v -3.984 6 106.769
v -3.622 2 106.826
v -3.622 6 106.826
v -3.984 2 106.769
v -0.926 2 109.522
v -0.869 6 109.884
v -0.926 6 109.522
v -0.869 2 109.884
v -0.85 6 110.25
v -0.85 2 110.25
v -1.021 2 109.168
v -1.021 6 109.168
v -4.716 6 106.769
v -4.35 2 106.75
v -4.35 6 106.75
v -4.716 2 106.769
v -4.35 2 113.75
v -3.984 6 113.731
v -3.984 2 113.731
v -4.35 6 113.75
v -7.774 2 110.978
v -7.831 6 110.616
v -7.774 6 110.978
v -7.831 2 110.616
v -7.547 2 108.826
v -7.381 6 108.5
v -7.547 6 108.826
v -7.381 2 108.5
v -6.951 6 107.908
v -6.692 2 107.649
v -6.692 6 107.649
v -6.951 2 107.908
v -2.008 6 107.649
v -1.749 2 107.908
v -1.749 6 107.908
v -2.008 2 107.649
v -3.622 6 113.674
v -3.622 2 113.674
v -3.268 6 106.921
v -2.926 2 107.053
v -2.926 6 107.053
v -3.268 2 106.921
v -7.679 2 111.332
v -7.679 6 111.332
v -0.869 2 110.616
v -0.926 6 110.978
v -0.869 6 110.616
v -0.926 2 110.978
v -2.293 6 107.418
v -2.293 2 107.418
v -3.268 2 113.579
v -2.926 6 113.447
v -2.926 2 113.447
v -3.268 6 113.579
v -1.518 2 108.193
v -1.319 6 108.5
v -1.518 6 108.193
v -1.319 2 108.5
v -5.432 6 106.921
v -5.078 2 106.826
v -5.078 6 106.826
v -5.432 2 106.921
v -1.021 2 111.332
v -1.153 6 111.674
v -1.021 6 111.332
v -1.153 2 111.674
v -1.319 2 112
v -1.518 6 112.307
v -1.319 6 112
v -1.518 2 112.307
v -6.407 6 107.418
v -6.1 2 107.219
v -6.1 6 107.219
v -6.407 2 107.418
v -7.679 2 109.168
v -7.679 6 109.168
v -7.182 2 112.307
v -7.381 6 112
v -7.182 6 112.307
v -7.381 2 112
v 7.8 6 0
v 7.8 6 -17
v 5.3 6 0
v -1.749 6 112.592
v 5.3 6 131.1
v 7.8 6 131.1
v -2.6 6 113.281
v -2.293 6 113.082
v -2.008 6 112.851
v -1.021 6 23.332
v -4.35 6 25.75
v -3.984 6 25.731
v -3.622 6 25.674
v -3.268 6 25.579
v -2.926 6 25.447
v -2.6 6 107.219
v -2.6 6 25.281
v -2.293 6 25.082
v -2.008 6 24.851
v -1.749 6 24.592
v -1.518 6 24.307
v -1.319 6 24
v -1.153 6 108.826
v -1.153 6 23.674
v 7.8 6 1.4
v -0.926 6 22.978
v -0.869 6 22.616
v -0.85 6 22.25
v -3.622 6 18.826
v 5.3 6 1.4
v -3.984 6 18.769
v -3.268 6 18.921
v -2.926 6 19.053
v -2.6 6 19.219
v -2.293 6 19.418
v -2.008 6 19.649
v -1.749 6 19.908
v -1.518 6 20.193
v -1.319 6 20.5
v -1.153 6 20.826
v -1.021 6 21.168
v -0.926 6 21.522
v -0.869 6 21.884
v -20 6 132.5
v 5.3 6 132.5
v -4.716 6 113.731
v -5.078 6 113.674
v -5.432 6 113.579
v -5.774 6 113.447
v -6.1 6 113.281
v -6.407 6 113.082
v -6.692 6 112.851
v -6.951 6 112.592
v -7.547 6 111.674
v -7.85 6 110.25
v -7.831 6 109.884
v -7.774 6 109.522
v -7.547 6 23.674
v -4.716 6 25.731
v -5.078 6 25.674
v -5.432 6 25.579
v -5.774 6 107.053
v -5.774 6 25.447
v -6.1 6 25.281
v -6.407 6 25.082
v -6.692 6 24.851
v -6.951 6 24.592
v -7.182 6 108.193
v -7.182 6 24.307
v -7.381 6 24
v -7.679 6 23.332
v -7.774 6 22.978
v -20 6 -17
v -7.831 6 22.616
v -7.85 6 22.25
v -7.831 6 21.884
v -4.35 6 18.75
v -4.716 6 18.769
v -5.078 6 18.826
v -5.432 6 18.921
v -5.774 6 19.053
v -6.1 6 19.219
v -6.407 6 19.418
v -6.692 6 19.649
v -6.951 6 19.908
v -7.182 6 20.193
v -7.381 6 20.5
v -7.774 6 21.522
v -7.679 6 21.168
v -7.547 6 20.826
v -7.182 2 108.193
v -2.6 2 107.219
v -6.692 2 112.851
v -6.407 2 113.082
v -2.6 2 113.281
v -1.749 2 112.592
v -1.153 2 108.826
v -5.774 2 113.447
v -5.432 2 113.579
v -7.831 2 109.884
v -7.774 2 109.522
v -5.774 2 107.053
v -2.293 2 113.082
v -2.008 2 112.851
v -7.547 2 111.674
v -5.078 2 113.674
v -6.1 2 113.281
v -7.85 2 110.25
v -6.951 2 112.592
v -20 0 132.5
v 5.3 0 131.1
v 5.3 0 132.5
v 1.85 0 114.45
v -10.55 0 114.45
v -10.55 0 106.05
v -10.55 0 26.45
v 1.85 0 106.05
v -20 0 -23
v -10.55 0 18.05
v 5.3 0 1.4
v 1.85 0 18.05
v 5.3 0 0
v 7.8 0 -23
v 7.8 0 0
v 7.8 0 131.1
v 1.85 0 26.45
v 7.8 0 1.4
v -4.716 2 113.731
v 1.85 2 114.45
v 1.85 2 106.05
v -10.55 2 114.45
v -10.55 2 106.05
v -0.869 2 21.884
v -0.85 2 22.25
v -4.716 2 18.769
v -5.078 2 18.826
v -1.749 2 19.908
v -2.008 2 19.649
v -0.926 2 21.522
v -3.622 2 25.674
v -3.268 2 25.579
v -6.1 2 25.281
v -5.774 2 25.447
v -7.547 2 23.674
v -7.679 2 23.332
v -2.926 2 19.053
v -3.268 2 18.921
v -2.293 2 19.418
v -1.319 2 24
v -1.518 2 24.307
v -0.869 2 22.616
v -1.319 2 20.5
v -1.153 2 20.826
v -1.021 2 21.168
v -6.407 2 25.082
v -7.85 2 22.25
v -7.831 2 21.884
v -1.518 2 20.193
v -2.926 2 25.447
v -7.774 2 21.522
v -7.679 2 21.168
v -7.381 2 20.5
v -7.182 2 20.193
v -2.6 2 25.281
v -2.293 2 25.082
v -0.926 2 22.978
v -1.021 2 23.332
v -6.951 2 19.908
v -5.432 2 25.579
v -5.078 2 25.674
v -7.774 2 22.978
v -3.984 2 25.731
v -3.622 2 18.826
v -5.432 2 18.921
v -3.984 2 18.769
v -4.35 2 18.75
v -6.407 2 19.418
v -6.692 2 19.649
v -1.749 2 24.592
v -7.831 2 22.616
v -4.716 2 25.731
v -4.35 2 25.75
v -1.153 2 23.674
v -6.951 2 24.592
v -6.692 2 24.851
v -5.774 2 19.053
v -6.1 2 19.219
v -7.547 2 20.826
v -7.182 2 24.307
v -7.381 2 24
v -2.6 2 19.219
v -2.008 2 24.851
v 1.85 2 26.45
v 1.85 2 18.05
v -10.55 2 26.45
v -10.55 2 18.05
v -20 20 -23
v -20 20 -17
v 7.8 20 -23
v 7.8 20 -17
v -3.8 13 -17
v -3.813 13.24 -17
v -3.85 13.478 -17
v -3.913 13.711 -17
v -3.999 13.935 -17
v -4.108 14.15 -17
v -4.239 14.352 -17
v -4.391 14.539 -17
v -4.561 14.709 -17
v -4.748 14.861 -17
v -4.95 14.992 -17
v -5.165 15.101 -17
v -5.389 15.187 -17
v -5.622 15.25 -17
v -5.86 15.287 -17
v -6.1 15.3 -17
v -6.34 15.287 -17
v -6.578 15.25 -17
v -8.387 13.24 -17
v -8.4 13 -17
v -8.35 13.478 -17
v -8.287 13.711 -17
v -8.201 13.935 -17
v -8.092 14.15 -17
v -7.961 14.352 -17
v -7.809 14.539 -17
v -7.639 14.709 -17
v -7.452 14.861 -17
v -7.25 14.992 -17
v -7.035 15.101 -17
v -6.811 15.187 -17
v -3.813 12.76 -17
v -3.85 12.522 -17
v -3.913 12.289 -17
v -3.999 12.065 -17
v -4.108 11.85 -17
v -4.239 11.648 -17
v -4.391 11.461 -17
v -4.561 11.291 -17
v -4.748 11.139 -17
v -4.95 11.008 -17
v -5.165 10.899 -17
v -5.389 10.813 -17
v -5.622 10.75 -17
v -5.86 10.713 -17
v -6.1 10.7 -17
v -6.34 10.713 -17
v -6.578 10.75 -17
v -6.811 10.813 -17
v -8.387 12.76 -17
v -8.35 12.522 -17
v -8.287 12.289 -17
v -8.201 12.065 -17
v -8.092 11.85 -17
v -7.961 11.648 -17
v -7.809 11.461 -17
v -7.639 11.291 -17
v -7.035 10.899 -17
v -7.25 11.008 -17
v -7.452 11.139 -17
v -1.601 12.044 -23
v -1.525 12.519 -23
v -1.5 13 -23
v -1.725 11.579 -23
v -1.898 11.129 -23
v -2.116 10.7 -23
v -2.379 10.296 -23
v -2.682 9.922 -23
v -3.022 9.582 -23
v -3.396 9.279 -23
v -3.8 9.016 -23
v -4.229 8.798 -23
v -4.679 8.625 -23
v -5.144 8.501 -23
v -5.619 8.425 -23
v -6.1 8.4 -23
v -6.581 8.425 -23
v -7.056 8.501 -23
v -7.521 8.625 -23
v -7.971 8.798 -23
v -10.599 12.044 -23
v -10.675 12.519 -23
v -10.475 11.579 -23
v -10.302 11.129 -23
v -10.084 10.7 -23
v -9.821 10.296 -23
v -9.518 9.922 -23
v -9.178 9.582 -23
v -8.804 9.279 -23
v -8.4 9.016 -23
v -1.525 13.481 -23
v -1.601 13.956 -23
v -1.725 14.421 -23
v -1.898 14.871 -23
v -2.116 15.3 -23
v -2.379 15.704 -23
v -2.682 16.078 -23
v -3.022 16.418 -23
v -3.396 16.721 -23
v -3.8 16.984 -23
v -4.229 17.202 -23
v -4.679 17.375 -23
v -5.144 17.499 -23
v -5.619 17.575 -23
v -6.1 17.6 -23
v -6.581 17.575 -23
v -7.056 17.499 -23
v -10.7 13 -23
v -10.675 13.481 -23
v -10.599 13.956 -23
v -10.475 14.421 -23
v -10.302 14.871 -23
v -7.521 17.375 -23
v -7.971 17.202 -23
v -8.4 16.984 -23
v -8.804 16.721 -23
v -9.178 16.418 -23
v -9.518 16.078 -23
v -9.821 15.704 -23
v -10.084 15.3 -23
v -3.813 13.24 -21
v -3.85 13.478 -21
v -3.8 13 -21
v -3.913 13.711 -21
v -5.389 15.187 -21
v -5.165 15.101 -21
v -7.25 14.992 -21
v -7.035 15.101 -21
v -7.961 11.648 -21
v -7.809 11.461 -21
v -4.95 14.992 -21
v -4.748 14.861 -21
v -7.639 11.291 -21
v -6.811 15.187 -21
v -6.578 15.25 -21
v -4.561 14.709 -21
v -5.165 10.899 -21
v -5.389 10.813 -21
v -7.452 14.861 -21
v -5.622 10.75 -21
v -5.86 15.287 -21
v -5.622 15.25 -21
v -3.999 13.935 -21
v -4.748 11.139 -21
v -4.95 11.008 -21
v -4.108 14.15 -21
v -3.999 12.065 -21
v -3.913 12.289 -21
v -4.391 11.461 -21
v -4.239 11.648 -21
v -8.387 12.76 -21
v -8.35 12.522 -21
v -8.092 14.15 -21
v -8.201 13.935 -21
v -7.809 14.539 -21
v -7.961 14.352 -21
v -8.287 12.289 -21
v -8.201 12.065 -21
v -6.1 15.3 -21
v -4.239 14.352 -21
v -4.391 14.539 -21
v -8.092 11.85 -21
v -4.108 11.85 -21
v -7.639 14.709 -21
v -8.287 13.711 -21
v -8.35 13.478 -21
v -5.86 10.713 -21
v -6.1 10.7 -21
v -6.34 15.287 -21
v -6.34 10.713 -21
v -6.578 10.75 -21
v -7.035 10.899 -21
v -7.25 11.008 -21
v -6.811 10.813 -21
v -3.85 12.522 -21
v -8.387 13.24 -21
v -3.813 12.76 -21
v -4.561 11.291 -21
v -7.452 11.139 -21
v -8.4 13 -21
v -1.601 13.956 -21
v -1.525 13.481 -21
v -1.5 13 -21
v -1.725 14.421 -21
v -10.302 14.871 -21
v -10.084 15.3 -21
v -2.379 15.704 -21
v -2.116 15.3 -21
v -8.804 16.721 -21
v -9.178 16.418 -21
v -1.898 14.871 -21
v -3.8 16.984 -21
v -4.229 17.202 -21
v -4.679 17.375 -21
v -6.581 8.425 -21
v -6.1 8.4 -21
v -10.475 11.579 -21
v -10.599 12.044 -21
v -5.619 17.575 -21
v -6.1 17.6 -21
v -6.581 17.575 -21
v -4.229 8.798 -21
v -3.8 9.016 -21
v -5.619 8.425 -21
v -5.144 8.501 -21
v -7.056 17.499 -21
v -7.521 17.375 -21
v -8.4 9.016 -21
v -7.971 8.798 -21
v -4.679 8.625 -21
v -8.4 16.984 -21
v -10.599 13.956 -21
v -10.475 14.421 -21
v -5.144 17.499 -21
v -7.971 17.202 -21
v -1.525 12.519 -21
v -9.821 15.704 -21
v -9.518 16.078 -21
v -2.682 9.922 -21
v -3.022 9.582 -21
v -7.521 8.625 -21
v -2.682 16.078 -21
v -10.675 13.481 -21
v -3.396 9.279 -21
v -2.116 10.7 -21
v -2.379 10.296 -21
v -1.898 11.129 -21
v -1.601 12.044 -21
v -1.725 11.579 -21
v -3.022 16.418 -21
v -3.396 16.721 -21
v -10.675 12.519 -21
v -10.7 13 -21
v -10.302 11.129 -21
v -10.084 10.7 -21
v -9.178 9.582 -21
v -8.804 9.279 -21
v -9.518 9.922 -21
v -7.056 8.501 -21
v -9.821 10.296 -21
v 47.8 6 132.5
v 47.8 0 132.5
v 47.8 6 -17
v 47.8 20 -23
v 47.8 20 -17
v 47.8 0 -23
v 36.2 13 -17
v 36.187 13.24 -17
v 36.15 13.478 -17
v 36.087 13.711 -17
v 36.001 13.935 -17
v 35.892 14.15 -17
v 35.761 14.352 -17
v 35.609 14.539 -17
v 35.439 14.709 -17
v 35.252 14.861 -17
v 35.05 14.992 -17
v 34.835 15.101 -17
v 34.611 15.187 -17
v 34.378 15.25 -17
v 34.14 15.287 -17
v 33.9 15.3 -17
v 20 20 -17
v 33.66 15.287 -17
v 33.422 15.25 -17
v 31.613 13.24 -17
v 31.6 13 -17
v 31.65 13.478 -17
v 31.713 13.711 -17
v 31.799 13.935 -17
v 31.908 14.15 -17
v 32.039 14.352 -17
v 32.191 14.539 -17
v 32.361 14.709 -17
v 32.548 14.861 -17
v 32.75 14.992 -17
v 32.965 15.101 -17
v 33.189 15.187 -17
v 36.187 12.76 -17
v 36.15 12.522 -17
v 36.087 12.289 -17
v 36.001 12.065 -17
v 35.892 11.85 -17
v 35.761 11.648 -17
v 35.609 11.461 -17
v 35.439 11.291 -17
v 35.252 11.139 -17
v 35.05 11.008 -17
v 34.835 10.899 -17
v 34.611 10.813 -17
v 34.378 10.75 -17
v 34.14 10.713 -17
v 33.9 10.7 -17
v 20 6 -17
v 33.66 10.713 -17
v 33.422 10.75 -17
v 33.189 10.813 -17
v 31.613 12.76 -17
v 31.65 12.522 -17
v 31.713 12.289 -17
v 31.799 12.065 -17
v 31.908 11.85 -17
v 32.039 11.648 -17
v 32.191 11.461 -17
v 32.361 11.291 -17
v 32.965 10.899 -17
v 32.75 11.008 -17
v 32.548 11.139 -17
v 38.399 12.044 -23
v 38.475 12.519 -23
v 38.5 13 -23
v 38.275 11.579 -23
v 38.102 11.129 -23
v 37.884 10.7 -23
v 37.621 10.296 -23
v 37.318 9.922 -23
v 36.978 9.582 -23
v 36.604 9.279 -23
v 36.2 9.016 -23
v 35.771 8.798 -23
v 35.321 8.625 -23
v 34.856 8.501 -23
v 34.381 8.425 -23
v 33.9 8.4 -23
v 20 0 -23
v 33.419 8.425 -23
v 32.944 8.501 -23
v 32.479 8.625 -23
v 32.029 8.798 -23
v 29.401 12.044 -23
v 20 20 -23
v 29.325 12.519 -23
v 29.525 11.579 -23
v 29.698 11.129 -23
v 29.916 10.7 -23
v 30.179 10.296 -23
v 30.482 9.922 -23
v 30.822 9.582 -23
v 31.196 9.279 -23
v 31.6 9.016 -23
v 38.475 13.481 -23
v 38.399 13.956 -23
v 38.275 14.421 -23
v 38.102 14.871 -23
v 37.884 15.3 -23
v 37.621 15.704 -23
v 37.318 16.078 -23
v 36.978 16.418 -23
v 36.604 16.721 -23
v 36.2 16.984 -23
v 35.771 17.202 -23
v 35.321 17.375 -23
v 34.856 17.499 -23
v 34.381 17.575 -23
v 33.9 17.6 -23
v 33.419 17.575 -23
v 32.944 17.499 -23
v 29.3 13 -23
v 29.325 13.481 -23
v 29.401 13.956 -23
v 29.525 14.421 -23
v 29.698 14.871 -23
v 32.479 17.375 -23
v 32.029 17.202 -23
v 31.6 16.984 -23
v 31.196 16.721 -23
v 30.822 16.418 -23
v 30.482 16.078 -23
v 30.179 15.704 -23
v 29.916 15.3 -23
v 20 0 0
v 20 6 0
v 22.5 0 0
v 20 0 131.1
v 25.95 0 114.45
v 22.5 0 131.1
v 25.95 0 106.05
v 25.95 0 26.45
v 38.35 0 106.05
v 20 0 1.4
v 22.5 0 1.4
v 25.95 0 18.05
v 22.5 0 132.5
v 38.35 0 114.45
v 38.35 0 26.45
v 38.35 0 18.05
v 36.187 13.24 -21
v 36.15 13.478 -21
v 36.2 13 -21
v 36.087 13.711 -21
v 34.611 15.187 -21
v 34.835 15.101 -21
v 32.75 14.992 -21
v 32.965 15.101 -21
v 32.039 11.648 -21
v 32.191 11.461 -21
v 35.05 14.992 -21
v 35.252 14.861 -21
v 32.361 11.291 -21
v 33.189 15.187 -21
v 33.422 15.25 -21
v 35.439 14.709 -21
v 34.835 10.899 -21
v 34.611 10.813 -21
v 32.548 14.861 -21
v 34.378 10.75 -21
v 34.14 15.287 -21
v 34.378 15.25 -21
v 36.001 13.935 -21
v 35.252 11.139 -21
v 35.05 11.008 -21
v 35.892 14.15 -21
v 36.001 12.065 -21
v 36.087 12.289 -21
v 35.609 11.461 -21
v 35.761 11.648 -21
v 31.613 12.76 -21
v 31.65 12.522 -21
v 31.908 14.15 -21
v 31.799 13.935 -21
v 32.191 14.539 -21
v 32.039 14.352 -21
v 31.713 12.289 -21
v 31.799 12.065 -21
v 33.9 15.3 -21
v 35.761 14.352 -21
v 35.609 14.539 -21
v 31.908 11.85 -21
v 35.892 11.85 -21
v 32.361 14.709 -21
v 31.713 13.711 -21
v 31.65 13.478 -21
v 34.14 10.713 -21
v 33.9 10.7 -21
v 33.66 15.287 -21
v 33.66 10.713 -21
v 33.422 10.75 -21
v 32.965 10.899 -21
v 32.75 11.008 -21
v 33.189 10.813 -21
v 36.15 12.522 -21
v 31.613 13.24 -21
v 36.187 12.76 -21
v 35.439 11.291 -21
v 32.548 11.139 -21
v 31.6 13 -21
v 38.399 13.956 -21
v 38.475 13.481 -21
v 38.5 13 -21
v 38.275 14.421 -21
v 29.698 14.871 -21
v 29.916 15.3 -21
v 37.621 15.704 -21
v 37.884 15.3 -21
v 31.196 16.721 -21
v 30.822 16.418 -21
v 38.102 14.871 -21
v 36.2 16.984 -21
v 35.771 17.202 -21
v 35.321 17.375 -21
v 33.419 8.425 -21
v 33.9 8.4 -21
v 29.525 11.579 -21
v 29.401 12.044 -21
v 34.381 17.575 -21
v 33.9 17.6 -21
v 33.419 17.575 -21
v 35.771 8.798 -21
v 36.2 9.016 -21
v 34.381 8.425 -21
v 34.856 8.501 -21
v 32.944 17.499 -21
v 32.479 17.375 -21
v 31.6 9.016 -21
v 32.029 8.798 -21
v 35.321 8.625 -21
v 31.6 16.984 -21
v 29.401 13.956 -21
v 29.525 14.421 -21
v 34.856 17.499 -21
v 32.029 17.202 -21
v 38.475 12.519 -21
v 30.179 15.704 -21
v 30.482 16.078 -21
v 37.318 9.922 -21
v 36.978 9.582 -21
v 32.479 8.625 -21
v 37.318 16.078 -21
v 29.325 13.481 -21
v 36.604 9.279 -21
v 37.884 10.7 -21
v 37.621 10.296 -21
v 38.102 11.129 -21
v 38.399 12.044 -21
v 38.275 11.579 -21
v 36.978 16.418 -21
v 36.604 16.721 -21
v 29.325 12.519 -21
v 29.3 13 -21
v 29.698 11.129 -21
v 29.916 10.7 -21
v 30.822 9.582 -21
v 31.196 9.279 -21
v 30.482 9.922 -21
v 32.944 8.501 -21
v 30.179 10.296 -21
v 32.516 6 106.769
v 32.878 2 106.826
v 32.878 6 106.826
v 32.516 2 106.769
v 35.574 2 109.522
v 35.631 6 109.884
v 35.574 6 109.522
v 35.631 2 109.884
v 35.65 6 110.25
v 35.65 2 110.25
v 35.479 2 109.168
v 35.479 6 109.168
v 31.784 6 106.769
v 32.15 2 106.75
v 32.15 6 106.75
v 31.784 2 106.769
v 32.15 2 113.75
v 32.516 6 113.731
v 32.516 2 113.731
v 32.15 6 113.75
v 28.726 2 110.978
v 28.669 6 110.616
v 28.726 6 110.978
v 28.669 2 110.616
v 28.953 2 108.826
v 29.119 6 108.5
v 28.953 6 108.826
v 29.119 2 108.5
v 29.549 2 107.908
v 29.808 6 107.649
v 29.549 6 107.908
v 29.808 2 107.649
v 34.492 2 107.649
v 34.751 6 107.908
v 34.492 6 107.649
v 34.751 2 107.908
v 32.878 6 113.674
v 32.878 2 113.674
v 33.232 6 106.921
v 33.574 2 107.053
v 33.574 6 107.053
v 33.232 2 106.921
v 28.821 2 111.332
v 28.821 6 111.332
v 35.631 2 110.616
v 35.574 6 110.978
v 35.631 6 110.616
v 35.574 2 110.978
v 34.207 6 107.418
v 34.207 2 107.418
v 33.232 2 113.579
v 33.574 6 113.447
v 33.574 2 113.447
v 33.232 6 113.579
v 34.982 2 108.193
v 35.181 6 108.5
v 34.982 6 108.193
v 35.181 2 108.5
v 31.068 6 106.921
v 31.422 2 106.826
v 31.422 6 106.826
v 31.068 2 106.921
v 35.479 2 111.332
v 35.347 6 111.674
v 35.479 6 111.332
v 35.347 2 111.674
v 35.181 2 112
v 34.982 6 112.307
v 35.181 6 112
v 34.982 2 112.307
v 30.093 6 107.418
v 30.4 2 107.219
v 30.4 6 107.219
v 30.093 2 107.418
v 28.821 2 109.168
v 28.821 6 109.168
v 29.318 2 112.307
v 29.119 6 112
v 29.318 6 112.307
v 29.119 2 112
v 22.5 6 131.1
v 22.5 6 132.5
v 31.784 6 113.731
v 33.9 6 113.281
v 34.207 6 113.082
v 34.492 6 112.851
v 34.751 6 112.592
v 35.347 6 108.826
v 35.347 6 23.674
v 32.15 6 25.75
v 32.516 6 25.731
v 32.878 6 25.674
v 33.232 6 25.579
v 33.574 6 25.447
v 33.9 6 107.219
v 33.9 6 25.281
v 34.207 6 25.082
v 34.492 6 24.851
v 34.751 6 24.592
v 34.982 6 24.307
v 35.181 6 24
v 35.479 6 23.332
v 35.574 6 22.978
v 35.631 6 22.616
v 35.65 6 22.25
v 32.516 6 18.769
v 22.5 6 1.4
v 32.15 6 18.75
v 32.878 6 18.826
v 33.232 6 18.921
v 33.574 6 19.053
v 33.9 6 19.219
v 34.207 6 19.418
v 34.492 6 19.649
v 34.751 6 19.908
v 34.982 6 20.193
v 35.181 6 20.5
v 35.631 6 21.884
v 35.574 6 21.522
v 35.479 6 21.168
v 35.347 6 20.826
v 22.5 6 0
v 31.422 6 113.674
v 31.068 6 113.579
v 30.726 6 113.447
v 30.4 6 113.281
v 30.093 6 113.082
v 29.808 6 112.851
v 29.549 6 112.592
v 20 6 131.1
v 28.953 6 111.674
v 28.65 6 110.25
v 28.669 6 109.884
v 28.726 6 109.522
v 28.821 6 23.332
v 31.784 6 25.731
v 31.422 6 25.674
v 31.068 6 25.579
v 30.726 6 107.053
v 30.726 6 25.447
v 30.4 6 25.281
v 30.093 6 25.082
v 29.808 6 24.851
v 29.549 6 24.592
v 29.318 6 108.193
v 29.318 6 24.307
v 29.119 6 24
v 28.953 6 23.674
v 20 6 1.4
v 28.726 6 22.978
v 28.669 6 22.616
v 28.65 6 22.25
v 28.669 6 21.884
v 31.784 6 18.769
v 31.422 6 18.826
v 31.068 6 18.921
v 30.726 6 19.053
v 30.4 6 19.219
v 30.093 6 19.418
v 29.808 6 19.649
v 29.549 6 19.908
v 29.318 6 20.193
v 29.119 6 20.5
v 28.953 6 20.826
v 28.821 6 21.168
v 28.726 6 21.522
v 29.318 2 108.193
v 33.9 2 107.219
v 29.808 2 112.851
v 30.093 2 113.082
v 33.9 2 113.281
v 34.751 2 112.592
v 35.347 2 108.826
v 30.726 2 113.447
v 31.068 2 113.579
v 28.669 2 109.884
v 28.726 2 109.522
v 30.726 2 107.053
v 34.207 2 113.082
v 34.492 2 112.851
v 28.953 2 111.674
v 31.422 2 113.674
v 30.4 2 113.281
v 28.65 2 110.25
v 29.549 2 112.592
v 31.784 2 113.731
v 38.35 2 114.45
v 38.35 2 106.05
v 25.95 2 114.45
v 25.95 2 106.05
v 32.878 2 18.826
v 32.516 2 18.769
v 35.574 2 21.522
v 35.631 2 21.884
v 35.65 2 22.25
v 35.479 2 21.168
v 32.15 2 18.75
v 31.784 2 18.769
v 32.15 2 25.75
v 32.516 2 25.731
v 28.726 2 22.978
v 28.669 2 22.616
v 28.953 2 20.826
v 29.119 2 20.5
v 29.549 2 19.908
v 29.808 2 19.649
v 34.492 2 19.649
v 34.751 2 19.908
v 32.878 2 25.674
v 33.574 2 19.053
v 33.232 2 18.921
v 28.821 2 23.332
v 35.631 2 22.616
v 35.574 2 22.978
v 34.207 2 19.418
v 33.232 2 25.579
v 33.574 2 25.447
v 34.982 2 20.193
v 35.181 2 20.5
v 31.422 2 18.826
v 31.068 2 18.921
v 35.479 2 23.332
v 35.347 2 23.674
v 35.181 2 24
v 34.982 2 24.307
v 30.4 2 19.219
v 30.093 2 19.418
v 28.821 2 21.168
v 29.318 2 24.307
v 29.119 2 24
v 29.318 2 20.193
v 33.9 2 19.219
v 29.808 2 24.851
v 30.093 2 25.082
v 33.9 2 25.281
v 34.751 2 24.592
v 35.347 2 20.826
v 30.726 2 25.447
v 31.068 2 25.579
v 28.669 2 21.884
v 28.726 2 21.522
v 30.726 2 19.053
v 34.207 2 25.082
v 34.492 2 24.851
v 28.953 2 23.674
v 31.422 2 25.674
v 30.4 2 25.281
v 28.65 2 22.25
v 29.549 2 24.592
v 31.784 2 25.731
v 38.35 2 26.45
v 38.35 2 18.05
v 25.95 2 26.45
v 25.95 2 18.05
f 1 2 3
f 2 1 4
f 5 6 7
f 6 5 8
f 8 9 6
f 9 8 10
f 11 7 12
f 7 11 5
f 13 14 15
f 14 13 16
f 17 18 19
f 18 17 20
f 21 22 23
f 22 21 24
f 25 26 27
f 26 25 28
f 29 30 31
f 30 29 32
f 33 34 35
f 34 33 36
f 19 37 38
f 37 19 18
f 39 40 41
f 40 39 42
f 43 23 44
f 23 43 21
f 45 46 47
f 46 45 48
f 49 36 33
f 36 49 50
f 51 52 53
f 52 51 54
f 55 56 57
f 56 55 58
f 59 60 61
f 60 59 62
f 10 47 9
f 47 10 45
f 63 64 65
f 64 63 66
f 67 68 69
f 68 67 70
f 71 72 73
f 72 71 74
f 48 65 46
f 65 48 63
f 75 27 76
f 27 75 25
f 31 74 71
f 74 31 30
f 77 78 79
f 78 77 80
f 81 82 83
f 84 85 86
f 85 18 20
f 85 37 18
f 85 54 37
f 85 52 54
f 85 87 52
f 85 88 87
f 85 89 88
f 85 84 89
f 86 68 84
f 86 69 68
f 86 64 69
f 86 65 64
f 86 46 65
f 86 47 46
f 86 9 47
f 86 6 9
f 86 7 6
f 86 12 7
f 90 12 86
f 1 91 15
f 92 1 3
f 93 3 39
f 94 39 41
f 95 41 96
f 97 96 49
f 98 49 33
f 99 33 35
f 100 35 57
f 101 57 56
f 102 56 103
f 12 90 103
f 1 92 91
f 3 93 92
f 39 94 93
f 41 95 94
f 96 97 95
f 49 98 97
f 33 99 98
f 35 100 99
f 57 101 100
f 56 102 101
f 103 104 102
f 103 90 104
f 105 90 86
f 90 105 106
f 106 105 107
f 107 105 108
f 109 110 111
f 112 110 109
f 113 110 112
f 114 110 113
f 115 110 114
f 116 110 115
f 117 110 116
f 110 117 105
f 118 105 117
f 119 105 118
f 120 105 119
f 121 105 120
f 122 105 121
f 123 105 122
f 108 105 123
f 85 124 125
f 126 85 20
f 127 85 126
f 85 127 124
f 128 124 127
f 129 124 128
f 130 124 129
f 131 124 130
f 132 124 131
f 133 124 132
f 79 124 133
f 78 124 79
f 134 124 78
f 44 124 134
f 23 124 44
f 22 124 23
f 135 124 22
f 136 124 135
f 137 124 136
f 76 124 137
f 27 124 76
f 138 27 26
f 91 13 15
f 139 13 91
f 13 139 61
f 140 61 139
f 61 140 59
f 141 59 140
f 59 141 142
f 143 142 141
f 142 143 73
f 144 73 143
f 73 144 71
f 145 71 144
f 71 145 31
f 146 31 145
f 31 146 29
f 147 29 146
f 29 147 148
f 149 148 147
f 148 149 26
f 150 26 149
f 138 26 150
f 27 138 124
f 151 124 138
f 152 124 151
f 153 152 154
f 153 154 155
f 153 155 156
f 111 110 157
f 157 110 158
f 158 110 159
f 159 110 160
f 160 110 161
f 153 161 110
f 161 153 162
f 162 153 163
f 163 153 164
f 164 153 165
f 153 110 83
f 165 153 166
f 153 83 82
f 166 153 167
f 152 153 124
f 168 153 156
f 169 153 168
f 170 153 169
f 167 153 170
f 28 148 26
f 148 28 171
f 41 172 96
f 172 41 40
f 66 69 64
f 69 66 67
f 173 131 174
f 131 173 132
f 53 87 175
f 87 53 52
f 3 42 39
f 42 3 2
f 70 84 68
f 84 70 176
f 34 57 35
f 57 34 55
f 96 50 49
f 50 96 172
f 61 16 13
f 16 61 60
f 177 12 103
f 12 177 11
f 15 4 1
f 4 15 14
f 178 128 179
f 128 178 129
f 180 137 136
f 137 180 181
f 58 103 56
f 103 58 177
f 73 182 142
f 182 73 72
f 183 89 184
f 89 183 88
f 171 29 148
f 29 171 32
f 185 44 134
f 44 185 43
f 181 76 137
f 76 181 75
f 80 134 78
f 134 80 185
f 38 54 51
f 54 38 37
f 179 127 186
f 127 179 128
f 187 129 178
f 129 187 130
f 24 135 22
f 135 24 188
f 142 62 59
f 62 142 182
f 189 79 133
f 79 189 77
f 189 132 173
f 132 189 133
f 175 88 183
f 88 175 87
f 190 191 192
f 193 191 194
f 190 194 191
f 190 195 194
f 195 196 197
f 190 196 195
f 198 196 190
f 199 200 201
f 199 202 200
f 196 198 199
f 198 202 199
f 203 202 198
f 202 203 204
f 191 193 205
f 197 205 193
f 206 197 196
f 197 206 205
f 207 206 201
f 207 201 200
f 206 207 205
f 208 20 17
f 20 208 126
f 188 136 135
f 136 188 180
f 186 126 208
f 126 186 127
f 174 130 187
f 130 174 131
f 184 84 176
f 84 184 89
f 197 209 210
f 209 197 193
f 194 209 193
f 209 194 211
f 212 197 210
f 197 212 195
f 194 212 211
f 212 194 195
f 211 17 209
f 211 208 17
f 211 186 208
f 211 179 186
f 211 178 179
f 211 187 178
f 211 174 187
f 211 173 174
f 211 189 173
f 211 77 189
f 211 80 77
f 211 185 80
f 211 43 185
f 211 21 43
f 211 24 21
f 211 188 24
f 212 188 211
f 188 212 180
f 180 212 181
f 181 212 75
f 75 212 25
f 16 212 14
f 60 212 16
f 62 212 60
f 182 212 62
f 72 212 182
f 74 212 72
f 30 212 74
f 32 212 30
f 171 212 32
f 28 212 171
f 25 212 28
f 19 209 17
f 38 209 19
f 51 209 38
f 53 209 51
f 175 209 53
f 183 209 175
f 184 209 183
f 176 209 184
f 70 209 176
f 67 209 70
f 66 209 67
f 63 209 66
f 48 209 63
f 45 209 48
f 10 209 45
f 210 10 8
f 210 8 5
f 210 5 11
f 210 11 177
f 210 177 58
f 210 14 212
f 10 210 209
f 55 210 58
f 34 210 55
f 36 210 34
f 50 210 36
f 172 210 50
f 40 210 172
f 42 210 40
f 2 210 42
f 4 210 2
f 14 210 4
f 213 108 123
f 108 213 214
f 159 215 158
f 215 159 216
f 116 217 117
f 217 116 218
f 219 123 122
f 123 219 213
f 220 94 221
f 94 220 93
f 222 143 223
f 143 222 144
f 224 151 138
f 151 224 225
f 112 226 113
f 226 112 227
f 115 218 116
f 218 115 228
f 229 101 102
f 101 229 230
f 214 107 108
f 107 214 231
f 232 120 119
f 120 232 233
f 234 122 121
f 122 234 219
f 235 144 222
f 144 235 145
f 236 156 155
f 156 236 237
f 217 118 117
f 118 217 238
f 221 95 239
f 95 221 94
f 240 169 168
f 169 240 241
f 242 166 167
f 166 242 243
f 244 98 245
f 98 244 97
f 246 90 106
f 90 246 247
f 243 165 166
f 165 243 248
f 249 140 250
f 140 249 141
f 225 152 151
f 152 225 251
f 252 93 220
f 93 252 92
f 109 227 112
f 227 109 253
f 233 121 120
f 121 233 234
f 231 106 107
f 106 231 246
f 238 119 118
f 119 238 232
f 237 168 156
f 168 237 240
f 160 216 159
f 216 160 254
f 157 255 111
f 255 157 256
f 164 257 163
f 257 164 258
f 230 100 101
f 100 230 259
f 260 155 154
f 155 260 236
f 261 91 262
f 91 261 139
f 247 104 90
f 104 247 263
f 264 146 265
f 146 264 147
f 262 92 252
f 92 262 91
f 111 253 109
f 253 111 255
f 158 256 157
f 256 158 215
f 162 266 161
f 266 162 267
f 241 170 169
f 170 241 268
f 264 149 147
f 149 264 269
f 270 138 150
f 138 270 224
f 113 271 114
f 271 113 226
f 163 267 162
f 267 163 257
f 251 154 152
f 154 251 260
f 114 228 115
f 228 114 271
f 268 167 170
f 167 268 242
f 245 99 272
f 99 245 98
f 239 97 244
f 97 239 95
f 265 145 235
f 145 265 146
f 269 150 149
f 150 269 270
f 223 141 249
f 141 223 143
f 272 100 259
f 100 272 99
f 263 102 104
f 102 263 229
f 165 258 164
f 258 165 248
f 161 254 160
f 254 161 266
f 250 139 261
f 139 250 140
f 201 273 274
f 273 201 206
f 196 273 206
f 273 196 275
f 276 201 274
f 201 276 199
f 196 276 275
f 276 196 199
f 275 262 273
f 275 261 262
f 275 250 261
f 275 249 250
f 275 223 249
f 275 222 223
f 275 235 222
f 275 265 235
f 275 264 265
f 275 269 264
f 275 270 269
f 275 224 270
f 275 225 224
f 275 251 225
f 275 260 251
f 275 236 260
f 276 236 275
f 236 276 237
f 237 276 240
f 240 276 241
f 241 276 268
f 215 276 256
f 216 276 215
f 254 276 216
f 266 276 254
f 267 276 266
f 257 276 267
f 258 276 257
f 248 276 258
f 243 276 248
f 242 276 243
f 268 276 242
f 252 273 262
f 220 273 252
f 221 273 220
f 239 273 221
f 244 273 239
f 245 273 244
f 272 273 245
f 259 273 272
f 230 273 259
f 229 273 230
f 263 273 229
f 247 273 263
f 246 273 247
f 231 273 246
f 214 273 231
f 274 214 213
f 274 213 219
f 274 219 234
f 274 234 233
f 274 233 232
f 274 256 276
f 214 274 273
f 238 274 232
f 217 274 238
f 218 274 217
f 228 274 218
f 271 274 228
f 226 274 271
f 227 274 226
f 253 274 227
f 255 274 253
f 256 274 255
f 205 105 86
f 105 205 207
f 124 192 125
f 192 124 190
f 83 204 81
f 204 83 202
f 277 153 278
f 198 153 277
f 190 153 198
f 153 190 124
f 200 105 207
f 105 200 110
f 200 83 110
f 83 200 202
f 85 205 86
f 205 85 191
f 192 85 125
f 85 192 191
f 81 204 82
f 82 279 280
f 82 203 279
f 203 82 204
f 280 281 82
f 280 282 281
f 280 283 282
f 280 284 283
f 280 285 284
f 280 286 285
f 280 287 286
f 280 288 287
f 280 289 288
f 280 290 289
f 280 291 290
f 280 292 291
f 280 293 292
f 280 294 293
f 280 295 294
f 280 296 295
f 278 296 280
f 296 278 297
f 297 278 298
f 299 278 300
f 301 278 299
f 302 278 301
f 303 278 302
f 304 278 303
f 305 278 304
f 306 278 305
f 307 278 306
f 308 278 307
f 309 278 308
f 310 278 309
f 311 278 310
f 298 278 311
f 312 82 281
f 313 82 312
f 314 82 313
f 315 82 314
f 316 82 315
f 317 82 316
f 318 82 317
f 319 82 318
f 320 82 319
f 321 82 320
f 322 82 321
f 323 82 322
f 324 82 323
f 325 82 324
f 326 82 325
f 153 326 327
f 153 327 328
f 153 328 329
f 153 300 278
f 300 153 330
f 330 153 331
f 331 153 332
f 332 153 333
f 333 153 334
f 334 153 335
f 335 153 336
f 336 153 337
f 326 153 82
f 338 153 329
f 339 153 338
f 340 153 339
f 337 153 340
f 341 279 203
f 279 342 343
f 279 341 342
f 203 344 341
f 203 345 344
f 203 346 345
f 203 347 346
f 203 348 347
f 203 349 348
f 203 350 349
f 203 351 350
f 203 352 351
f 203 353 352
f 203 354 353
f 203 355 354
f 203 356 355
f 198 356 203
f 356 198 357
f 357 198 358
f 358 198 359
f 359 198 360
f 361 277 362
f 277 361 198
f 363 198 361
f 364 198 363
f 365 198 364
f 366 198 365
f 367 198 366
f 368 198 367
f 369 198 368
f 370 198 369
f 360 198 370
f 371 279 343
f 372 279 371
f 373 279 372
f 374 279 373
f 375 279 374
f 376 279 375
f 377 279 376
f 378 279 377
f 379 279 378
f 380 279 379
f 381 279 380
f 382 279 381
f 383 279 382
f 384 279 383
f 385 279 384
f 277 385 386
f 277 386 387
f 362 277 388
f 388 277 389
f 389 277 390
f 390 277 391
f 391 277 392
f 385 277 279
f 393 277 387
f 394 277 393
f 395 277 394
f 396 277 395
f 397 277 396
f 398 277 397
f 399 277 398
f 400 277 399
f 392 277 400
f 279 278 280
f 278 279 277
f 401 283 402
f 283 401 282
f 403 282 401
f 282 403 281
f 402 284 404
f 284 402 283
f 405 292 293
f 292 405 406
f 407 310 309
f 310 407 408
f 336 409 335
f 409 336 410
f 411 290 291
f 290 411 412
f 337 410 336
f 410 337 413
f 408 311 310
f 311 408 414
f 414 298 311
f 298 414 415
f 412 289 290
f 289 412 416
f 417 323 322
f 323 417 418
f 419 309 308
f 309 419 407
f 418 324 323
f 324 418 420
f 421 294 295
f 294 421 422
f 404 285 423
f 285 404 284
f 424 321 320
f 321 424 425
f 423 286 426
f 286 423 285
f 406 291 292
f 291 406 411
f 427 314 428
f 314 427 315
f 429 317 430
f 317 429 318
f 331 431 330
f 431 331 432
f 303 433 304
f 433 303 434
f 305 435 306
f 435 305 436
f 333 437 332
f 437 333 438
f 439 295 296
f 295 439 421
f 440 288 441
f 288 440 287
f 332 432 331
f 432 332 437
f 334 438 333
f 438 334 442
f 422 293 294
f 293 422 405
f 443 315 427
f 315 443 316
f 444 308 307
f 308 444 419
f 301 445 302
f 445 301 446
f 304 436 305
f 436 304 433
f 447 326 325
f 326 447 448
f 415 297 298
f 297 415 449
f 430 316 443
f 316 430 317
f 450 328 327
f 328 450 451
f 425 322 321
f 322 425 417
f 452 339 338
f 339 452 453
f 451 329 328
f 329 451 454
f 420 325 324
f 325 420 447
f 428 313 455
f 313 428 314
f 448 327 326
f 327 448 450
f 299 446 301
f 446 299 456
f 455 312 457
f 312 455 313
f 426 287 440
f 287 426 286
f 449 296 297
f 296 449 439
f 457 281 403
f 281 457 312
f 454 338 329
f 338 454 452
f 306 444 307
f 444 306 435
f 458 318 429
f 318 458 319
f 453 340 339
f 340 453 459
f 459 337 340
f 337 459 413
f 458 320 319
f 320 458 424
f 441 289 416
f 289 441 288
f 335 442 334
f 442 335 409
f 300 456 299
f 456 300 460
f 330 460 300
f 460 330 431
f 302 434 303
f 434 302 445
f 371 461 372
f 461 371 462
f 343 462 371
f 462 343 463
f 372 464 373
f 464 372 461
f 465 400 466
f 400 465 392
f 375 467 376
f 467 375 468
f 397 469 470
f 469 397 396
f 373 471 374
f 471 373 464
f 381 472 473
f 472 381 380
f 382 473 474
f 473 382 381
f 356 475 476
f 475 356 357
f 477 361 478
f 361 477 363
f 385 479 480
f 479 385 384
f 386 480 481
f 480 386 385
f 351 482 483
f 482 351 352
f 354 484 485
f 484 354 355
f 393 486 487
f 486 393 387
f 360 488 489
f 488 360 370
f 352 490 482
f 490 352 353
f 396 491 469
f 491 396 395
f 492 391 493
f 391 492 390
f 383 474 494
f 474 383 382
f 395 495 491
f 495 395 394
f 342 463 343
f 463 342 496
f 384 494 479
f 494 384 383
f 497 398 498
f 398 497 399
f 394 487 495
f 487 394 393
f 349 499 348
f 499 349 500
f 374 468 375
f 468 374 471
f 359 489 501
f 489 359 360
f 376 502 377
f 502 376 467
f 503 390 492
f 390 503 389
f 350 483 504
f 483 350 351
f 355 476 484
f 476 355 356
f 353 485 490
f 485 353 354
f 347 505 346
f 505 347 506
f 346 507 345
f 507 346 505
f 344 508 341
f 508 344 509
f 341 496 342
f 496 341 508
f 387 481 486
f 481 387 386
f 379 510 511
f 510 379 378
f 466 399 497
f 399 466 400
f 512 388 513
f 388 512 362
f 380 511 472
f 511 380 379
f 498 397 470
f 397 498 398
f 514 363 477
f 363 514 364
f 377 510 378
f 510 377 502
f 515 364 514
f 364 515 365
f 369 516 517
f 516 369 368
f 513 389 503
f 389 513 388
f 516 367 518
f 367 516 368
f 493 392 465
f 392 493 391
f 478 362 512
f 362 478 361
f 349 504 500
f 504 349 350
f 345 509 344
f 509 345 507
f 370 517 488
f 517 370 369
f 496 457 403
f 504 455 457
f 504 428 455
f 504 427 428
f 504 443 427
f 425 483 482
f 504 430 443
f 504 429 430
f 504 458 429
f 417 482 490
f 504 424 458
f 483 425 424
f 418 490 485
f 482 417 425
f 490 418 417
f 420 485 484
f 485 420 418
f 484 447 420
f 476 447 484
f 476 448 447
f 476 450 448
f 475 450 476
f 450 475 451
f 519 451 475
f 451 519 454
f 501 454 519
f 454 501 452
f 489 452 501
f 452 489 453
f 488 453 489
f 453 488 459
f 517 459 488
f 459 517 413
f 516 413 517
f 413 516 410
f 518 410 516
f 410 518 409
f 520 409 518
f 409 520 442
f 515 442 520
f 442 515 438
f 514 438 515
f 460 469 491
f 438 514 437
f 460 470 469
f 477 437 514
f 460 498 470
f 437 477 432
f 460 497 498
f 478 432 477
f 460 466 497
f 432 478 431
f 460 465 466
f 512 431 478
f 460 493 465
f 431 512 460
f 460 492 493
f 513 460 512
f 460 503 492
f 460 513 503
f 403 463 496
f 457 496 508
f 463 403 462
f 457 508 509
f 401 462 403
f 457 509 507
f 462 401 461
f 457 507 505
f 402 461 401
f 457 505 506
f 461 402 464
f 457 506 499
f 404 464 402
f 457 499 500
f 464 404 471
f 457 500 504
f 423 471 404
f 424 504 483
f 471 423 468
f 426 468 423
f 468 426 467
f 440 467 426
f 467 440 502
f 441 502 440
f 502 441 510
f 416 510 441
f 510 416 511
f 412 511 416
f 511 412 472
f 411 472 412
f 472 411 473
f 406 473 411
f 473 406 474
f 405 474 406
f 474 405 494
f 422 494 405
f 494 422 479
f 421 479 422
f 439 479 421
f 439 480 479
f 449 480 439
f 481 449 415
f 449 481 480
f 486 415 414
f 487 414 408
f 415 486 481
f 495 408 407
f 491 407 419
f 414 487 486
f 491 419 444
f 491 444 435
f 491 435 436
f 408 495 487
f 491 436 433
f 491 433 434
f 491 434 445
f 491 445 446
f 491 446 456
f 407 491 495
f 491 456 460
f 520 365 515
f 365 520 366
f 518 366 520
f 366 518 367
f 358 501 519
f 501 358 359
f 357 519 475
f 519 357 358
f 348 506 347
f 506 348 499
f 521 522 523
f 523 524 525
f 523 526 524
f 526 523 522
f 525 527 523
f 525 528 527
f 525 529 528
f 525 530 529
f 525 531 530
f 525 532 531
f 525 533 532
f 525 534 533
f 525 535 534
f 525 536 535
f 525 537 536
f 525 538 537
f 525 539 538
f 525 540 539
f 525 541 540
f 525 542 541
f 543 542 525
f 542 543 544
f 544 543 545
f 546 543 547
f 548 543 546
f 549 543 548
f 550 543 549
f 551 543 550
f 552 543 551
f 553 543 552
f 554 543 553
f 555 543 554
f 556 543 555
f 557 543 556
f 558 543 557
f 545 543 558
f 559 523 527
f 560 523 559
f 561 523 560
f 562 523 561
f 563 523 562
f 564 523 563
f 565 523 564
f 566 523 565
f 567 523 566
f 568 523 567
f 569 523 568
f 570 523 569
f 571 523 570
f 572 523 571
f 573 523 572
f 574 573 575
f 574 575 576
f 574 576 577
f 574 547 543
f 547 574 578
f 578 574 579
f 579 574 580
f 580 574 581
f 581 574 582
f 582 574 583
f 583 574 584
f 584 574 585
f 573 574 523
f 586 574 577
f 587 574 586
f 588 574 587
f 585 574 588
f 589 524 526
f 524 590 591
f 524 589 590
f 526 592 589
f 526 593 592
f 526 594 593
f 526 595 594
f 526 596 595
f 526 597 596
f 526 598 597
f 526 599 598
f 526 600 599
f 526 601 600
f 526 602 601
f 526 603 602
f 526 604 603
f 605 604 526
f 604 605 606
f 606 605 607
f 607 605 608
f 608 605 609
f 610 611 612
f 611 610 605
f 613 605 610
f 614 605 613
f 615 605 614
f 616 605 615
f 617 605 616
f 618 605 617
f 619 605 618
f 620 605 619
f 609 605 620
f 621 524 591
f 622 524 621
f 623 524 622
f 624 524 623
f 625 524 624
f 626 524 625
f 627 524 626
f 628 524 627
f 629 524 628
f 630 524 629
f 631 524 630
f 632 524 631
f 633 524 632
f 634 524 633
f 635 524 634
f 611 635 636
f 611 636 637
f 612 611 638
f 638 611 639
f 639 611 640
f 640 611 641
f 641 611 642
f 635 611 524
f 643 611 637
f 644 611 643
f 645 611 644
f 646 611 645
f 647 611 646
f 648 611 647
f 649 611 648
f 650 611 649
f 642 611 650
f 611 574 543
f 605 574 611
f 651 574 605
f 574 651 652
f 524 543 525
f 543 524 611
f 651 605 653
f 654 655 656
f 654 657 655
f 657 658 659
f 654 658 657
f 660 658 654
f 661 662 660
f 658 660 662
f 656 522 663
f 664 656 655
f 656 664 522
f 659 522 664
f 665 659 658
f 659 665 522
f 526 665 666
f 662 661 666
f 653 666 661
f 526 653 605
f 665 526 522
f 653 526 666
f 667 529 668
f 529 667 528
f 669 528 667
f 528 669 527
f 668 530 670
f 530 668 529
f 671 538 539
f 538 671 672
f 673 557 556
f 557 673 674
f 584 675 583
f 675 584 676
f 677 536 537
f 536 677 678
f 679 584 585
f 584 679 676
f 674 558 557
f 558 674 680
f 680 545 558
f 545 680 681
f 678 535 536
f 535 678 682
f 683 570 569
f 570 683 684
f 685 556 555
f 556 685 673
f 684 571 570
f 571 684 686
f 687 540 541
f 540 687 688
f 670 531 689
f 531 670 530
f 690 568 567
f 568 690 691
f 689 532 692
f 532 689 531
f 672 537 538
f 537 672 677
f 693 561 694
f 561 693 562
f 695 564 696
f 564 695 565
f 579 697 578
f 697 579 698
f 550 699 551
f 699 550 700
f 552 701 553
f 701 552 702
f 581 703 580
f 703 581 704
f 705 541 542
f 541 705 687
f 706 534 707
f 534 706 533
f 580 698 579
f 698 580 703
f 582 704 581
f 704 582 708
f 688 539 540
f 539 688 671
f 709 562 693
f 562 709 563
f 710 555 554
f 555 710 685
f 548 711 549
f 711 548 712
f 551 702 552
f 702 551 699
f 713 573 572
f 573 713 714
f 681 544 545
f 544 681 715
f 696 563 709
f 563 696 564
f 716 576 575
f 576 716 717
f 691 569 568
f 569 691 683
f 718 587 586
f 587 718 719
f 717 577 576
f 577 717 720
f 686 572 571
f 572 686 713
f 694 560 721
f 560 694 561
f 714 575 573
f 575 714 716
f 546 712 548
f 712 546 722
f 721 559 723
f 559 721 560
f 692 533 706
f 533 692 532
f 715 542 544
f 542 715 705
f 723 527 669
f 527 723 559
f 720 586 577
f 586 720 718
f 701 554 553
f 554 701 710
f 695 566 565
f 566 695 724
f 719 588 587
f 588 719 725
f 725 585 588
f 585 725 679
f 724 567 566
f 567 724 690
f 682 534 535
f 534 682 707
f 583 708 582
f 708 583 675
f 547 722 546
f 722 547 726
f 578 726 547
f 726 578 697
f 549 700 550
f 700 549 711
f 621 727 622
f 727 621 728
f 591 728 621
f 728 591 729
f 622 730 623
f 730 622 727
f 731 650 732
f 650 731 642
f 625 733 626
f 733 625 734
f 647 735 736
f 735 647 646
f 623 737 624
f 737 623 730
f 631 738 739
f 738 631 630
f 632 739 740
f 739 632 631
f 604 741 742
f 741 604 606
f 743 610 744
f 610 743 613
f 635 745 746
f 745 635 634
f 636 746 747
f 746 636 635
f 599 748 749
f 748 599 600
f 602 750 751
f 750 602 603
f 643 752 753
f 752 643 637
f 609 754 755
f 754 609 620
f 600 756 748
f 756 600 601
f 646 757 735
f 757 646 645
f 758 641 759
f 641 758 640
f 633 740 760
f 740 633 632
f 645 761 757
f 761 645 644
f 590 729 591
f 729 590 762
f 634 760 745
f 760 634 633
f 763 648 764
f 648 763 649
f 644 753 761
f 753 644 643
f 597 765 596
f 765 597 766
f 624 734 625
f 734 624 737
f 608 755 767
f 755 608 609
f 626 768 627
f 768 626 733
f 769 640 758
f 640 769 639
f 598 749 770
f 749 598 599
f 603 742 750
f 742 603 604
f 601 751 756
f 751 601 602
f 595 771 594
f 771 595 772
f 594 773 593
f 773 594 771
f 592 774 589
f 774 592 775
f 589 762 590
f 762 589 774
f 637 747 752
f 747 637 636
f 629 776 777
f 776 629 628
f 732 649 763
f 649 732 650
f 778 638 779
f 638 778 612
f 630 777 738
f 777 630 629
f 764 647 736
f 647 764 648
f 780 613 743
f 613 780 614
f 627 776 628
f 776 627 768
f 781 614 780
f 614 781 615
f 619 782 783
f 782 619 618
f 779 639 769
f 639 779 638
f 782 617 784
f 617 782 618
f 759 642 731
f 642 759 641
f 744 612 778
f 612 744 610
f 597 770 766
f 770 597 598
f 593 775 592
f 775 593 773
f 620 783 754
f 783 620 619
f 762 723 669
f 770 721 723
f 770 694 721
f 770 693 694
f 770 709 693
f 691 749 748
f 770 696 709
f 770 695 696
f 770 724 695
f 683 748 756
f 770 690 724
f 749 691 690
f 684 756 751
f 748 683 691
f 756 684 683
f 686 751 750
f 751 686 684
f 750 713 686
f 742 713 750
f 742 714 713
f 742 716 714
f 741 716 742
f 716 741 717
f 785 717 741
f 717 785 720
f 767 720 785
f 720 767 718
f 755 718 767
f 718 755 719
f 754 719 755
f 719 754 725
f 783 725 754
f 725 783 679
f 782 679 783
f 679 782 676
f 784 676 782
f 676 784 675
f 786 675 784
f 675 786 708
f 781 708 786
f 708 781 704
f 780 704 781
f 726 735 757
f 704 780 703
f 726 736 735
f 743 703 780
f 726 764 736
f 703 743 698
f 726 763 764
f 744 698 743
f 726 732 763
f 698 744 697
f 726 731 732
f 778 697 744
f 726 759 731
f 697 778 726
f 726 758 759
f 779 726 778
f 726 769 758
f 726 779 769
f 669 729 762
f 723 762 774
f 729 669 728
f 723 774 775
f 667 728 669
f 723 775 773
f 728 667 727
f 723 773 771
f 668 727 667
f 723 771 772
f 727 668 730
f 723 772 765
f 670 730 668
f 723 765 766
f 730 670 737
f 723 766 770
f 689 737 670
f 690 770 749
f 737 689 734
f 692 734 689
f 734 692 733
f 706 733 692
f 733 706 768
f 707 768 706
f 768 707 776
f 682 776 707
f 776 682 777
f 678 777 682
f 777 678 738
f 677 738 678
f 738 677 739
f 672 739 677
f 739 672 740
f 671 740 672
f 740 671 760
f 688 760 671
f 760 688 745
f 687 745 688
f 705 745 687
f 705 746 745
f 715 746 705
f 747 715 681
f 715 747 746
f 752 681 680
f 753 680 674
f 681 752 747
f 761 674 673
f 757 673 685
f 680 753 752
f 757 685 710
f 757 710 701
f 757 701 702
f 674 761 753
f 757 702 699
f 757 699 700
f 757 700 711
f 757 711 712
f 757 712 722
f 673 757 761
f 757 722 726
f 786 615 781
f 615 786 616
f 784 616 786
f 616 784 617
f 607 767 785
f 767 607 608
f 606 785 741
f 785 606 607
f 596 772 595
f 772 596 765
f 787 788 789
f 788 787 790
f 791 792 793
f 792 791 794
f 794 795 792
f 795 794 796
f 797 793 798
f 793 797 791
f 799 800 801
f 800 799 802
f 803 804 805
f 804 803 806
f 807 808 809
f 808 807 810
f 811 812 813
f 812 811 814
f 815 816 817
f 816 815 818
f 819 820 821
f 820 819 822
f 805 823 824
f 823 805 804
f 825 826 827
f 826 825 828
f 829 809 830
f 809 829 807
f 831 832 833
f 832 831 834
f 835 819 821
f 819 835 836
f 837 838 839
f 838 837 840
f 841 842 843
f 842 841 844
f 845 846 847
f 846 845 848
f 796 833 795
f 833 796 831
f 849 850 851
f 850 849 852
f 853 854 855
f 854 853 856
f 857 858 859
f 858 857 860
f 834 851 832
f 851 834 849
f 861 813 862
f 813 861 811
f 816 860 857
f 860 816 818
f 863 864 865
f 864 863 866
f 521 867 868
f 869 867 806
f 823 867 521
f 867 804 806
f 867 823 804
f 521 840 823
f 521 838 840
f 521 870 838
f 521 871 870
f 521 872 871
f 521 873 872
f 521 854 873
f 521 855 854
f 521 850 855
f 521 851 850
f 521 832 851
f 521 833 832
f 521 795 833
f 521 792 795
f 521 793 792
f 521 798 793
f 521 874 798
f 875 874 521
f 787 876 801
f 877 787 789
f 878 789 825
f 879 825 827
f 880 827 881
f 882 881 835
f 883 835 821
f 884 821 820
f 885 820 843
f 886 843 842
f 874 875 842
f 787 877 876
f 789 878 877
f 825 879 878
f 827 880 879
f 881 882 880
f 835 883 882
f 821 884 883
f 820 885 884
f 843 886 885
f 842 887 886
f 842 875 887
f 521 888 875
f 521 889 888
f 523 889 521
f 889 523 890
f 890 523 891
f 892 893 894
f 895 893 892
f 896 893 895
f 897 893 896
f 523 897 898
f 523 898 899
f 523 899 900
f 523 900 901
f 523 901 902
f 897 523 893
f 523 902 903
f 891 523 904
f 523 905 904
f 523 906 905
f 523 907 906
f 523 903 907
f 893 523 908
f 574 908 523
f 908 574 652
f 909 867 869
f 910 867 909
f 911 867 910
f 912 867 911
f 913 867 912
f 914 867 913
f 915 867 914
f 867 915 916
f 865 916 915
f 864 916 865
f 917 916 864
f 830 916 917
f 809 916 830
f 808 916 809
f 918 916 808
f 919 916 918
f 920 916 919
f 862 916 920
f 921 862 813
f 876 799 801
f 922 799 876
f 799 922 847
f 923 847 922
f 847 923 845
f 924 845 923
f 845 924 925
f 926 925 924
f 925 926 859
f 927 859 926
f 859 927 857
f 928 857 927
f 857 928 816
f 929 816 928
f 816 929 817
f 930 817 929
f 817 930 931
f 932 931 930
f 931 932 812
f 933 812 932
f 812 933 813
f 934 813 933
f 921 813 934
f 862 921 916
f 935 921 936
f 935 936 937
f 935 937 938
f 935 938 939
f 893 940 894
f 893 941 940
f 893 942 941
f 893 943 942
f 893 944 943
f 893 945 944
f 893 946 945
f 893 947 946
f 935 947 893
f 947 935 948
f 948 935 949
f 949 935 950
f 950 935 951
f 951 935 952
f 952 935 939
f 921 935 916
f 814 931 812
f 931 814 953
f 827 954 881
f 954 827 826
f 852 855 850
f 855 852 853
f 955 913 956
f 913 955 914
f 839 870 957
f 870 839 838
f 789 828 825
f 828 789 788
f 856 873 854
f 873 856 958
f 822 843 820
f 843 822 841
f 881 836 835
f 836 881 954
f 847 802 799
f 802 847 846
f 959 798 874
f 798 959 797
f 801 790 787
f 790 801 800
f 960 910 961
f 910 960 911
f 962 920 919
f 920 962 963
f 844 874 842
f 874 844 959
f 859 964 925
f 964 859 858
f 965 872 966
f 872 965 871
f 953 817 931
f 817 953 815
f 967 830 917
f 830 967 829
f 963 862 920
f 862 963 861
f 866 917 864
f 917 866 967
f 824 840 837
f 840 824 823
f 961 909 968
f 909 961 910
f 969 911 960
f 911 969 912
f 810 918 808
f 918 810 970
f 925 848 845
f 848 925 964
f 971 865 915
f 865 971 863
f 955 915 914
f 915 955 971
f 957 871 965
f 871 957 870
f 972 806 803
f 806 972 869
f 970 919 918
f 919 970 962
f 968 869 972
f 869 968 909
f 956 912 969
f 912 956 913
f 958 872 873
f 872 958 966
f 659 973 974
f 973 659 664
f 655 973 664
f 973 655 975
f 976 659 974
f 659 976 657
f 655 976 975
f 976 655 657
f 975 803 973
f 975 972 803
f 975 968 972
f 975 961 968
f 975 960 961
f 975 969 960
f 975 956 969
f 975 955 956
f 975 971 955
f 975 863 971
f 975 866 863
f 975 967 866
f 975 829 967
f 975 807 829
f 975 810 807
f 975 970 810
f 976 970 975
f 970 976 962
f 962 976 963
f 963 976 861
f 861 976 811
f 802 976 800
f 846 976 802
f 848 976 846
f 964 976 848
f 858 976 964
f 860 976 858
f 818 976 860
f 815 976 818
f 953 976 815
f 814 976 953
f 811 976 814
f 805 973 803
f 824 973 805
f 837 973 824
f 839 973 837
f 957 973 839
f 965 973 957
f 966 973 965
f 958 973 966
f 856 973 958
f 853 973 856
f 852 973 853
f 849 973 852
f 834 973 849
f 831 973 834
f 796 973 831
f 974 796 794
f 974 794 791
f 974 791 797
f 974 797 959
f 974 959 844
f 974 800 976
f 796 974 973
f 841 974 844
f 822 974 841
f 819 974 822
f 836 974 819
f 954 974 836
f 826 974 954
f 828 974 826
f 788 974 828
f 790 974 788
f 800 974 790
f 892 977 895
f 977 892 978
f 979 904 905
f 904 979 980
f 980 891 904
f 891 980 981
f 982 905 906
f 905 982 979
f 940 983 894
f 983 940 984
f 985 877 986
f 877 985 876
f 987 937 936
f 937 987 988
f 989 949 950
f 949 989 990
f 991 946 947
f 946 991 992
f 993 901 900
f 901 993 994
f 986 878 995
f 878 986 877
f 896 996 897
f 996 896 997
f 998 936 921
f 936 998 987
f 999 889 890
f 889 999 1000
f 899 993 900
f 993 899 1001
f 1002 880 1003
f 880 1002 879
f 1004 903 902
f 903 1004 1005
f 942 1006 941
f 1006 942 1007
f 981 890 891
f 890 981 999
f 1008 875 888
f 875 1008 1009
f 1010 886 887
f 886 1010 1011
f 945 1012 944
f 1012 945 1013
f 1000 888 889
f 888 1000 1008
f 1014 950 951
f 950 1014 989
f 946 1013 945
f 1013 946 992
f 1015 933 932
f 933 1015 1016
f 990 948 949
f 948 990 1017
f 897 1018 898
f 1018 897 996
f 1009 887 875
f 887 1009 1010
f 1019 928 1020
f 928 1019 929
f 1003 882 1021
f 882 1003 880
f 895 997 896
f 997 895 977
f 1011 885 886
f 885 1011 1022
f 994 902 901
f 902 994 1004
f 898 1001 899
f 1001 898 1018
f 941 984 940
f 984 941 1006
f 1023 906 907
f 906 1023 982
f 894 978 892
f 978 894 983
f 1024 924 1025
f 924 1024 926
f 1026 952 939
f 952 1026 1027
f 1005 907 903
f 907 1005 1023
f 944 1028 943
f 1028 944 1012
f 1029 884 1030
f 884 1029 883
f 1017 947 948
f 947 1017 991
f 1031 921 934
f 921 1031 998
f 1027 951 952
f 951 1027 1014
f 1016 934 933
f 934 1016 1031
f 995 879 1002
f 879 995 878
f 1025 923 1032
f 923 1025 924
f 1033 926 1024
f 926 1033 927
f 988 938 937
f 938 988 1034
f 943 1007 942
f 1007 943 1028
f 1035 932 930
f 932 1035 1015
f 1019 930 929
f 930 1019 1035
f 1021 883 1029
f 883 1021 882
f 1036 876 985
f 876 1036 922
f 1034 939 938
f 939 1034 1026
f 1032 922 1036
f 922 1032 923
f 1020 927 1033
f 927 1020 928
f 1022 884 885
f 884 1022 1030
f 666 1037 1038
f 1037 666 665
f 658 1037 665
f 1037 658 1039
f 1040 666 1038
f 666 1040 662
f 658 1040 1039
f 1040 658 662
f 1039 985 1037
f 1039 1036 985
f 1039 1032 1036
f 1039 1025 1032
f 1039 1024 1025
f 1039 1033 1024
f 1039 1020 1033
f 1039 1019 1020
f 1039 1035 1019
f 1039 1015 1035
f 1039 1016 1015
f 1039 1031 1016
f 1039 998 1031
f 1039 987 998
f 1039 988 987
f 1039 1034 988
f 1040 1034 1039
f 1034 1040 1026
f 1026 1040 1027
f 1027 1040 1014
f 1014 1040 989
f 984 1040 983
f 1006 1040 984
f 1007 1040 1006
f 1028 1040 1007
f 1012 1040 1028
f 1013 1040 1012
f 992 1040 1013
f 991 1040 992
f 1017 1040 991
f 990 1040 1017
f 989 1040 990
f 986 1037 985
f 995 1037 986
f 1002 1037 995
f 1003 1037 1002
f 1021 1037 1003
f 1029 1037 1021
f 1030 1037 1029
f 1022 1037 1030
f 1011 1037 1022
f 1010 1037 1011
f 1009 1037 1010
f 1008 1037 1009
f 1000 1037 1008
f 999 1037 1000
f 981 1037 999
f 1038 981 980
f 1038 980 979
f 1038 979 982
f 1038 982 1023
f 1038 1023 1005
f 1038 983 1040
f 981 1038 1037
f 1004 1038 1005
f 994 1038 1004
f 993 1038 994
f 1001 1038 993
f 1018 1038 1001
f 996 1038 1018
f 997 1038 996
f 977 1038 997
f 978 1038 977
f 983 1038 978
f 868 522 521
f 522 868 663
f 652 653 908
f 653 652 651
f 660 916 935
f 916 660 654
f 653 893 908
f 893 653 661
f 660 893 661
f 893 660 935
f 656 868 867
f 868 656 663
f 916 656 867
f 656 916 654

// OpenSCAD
$fn = 60;

t = 6;

rack_w = 27.8;
rack_l = 132.5;

rack_c_w = 2.5;
rack_c_l = 1.4;

rack_h_distance = 88;
rack_h_offset_w = 12.15;
rack_h_offset_l = 22.25;
rack_h_dia = 7;

shelf_l = 17;
shelf_d = 14;
shelf_h_dia = 4.6;

module main_left() {
difference() {
    cube([rack_w, t, rack_l]);
    translate([rack_w - rack_c_w, 0, 0]) cube([rack_c_w, t, rack_c_l]);
    translate([rack_w - rack_c_w, 0, rack_l - rack_c_l]) cube([rack_c_w, t, rack_c_l]);
    translate([rack_w - rack_h_offset_w, 0, rack_h_offset_l]) {
        rotate([-90, 0, 0]) cylinder(h = t, d = rack_h_dia);
        translate([-12.4 / 2, 0, -8.4 / 2]) cube([12.4, 2, 8.4]);
        translate([0, 0, rack_h_distance]) {
            rotate([-90, 0, 0]) cylinder(h = t, d = rack_h_dia);
            translate([-12.4 / 2, 0, -8.4 / 2]) cube([12.4, 2, 8.4]);
        }
    }
}

translate([0, 0, -shelf_l]) {		
    cube([rack_w, t, shelf_l]);
}

translate([0, 0, -shelf_l - t]) {
    difference() {
        cube([rack_w, t + shelf_d, t]);
        translate([rack_w / 2, t + shelf_d / 2, 0]) cylinder(h = t, d = shelf_h_dia);
        translate([rack_w / 2, t + shelf_d / 2, 0]) cylinder(h = 2, d = shelf_h_dia * 2);
    }
}
}

module main_right() {
difference() {
    cube([rack_w, t, rack_l]);
    translate([0, 0, 0]) cube([rack_c_w, t, rack_c_l]);
    translate([0, 0, rack_l - rack_c_l]) cube([rack_c_w, t, rack_c_l]);
    translate([rack_h_offset_w, 0, rack_h_offset_l]) {
        rotate([-90, 0, 0]) cylinder(h = t, d = rack_h_dia);
        translate([-12.4 / 2, 0, -8.4 / 2]) cube([12.4, 2, 8.4]);
        translate([0, 0, rack_h_distance]) {
            rotate([-90, 0, 0]) cylinder(h = t, d = rack_h_dia);
            translate([-12.4 / 2, 0, -8.4 / 2]) cube([12.4, 2, 8.4]);
        }
    }
}

translate([0, 0, -shelf_l]) {		
    cube([rack_w, t, shelf_l]);
}

translate([0, 0, -shelf_l - t]) {
    difference() {
        cube([rack_w, t + shelf_d, t]);
        translate([rack_w / 2, t + shelf_d / 2, 0]) cylinder(h = t, d = shelf_h_dia);
        translate([rack_w / 2, t + shelf_d / 2, 0]) cylinder(h = 2, d = shelf_h_dia * 2);
    }
}
}

translate([-20, 0, 0]) main_left();
translate([ 20, 0, 0]) main_right();
